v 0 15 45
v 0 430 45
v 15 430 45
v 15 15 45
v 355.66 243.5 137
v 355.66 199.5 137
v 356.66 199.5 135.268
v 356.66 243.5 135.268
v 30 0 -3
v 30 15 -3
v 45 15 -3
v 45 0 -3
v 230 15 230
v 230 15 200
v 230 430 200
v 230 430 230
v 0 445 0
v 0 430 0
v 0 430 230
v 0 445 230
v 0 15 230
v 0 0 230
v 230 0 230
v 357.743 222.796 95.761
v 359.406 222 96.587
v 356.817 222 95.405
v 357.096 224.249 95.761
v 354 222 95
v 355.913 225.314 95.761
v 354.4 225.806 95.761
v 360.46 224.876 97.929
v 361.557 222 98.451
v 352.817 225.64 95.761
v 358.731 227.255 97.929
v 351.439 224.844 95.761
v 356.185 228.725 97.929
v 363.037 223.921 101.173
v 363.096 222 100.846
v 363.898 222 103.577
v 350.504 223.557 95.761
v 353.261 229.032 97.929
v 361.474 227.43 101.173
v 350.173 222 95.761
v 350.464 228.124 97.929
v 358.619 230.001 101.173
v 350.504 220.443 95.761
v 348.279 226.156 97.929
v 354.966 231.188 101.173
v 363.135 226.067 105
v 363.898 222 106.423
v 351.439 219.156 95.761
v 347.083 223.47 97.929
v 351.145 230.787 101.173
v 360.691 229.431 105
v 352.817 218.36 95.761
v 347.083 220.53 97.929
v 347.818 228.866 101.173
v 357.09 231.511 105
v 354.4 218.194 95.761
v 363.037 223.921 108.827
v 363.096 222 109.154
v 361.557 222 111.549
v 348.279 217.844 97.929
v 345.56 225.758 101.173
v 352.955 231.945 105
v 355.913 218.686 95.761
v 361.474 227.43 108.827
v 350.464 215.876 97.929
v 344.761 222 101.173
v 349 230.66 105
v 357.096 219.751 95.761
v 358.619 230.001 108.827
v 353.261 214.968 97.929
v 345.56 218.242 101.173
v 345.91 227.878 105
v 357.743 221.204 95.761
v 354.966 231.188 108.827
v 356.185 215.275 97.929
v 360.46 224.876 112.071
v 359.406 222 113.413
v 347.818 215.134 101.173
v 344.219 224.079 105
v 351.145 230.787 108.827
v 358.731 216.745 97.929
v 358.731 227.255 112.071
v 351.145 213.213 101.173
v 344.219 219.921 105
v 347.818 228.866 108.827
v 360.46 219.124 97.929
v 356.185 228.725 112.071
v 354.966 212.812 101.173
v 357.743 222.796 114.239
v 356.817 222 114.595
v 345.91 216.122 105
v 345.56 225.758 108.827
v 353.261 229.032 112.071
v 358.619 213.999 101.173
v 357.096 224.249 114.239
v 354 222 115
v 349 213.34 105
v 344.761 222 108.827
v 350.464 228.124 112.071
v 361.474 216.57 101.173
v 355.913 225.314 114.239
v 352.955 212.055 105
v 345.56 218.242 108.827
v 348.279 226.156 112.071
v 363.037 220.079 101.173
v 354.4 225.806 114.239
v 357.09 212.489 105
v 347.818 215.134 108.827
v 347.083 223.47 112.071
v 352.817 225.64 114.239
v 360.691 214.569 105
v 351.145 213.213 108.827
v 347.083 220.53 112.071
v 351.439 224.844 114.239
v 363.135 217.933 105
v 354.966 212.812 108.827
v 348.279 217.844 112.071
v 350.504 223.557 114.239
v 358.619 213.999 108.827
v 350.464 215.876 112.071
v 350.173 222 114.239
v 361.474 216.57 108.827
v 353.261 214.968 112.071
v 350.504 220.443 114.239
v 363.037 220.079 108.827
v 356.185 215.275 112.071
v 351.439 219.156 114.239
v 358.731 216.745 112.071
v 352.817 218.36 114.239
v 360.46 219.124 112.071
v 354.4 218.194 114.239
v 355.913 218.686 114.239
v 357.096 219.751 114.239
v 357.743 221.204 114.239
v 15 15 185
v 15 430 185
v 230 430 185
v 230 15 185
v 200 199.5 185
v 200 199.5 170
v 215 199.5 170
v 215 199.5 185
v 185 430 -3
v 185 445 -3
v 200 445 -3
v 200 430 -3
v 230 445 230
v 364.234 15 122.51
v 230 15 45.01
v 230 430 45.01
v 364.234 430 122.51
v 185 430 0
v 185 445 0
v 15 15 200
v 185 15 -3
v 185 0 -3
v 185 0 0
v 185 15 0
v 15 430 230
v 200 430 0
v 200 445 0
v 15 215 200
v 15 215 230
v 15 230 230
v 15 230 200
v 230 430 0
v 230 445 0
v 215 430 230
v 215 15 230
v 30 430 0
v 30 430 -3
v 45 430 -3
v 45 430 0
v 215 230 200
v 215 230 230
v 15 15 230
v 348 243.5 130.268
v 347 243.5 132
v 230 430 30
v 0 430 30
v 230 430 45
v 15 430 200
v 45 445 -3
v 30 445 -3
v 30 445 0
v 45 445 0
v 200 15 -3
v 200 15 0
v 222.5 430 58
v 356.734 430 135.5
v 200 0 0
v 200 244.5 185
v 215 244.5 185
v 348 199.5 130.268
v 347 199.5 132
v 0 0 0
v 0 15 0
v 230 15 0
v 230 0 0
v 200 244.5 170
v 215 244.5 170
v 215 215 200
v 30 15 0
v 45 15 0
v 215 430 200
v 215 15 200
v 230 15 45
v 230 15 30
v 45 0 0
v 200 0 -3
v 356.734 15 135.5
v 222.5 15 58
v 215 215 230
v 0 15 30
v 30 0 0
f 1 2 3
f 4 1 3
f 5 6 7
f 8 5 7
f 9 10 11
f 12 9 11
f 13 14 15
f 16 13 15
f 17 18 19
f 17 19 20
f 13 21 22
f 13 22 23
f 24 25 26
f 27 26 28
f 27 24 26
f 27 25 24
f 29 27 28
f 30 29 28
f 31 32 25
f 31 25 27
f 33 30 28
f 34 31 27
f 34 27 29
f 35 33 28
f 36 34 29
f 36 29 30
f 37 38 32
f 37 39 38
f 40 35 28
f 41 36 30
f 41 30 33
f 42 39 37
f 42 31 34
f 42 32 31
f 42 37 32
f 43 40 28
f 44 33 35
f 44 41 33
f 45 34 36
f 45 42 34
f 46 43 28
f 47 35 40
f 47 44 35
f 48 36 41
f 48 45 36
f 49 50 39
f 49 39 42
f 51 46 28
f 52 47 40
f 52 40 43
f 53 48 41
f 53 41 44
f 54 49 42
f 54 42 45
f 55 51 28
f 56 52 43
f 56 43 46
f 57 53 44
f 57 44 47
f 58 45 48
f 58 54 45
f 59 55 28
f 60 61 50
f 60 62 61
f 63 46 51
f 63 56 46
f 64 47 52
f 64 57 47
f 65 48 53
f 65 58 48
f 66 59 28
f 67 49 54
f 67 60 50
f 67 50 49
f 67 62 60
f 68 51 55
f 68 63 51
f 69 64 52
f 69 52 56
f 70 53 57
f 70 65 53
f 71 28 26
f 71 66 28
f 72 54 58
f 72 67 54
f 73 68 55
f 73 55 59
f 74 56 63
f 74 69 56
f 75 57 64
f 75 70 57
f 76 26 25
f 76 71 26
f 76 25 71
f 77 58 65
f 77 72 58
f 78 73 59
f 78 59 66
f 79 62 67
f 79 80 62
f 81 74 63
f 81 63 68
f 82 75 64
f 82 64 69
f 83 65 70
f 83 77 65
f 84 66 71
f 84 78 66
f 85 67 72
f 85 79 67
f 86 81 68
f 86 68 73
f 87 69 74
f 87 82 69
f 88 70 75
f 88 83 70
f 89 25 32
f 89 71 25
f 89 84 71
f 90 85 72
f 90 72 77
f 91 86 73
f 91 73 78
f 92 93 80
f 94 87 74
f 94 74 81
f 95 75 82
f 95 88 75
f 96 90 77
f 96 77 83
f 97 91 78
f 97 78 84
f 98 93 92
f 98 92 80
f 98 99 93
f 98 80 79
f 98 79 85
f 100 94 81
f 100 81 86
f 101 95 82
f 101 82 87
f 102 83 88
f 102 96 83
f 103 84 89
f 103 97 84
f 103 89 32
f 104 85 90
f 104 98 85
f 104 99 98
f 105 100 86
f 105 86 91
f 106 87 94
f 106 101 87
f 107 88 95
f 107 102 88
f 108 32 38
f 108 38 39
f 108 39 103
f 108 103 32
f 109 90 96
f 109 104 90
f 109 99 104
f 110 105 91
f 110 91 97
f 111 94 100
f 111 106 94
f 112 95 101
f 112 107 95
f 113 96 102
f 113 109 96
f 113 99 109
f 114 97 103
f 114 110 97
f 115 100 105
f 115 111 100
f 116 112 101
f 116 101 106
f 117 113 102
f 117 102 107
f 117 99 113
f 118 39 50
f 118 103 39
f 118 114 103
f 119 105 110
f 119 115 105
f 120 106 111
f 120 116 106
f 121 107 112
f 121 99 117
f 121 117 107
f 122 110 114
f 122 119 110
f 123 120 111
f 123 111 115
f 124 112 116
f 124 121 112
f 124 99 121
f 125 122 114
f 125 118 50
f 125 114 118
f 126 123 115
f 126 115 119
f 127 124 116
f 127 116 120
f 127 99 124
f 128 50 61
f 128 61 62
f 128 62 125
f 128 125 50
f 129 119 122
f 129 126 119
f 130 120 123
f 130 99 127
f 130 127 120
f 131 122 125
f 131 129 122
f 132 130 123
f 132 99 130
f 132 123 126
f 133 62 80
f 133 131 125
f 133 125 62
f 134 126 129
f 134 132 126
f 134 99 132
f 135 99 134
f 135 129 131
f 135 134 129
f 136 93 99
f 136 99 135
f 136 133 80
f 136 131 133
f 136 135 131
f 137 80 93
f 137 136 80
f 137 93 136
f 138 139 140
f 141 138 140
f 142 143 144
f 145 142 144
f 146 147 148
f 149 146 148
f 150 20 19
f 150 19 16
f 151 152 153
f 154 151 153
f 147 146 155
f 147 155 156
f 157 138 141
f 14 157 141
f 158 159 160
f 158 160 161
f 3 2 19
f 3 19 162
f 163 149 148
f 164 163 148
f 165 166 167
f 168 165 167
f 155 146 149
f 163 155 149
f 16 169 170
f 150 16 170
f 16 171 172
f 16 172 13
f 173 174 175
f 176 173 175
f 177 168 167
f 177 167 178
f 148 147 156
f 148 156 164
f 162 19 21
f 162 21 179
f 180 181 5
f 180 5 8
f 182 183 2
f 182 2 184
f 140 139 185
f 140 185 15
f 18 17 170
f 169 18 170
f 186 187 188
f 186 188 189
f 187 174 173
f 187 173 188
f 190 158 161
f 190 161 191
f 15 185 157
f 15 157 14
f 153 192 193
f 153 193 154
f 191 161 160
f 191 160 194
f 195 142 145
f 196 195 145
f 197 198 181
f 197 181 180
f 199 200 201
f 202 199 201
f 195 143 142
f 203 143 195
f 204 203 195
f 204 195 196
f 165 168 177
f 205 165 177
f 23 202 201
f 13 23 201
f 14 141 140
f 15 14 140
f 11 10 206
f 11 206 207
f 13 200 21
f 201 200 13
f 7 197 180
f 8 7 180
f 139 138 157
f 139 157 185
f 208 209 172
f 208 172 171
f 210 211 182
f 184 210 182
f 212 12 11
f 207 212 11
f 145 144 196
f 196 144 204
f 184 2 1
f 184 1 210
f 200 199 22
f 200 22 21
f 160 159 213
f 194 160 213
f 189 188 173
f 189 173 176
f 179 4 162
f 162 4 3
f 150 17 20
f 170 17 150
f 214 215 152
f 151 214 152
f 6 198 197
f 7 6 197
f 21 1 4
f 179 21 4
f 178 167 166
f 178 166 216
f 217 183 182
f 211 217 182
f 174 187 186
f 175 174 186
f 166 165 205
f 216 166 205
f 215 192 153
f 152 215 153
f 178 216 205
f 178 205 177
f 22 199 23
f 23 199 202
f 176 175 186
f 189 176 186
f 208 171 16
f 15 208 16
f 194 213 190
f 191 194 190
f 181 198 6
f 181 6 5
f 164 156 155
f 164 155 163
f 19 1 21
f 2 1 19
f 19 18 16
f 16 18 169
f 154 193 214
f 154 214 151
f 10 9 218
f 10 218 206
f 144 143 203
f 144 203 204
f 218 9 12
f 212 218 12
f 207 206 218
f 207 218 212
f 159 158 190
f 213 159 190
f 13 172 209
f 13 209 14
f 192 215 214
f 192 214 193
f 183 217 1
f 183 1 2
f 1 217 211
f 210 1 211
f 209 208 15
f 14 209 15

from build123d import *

# Parameters (mm, degrees)
BOX_W              = 230
BOX_H              = 15
BOX_DEPTH          = 230
BOX001_W           = 215
BOX001_H           = 415
BOX001_DEPTH       = 15
BOX002_W           = 230
BOX002_H           = 15
BOX002_DEPTH       = 230
BOX003_W           = 200
BOX003_H           = 15
BOX003_DEPTH       = 30
BOX005_W           = 15
BOX005_H           = 415
BOX005_DEPTH       = 30
BOX006_W           = 15
BOX006_H           = 415
BOX006_DEPTH       = 185
BOX007_W           = 230
BOX007_H           = 415
BOX007_DEPTH       = 15
BOX008_W           = 15
BOX008_H           = 415
BOX008_DEPTH       = 155
BOX008_PITCH_ANGLE = 60
BOX010_W           = 15
BOX010_H           = 45
BOX010_DEPTH       = 15
BOX011_W           = 2
BOX011_H           = 44
BOX011_DEPTH       = 10
BOX011_PITCH_ANGLE = 60
BOX012_W           = 15
BOX012_H           = 15
BOX012_DEPTH       = 3
BOX013_W           = 15
BOX013_H           = 15
BOX013_DEPTH       = 3
BOX014_W           = 15
BOX014_H           = 15
BOX014_DEPTH       = 3
BOX015_W           = 15
BOX015_H           = 15
BOX015_DEPTH       = 3


with BuildPart() as suportelateralverticalesquerdo:
    # Box → Box (new body)
    with BuildSketch(Plane.XY):
        with Locations((115, 7.5)):
            Rectangle(BOX_W, BOX_H)
    extrude(amount=BOX_DEPTH)


with BuildPart() as tamposuperiorhorizontal:
    # Box001 → Box001 (new body)
    with BuildSketch(Plane(origin=(15, 15, 185), x_dir=(1, 0, 0), z_dir=(0, 0, 1))):
        with Locations((107.5, 207.5)):
            Rectangle(BOX001_W, BOX001_H)
    extrude(amount=BOX001_DEPTH)


with BuildPart() as suportelateralverticaldireito:
    # Box002 → Box002 (new body)
    with BuildSketch(Plane(origin=(0, 430, 0), x_dir=(1, 0, 0), z_dir=(0, 0, 1))):
        with Locations((115, 7.5)):
            Rectangle(BOX002_W, BOX002_H)
    extrude(amount=BOX002_DEPTH)


with BuildPart() as suporteverticalmeio:
    # Box003 → Box003 (new body)
    with BuildSketch(Plane(origin=(15, 215, 200), x_dir=(1, 0, 0), z_dir=(0, 0, 1))):
        with Locations((100, 7.5)):
            Rectangle(BOX003_W, BOX003_H)
    extrude(amount=BOX003_DEPTH)


with BuildPart() as suportefrentesuperiorvertical:
    # Box005 → Box005 (new body)
    with BuildSketch(Plane(origin=(215, 15, 200), x_dir=(1, 0, 0), z_dir=(0, 0, 1))):
        with Locations((7.5, 207.5)):
            Rectangle(BOX005_W, BOX005_H)
    extrude(amount=BOX005_DEPTH)


with BuildPart() as suportefundoinferiorvertical:
    # Box006 → Box006 (new body)
    with BuildSketch(Plane(origin=(0, 15, 45), x_dir=(1, 0, 0), z_dir=(0, 0, 1))):
        with Locations((7.5, 207.5)):
            Rectangle(BOX006_W, BOX006_H)
    extrude(amount=BOX006_DEPTH)


with BuildPart() as tampoinferiorhorizontal:
    # Box007 → Box007 (new body)
    with BuildSketch(Plane(origin=(0, 15, 30), x_dir=(1, 0, 0), z_dir=(0, 0, 1))):
        with Locations((115, 207.5)):
            Rectangle(BOX007_W, BOX007_H)
    extrude(amount=BOX007_DEPTH)


with BuildPart() as tampabasculante:
    # Box008 → Box008 (new body)
    with BuildSketch(Plane.XY):
        with Locations((7.5, 207.5)):
            Rectangle(BOX008_W, BOX008_H)
    extrude(amount=BOX008_DEPTH)


with BuildPart() as tampabasculante_1:
    # Box008 pitch: moved
    add(tampabasculante.part.rotate(Axis((0, 0, 0), (0, 1, 0)), BOX008_PITCH_ANGLE))


with BuildPart() as tampabasculante_2:
    # Box008 placement: moved
    add(tampabasculante_1.part.moved(Location((222.5, 15, 58))))


with BuildPart() as imadamesa_superiorhorizontal:
    # Box010 → Box010 (new body)
    with BuildSketch(Plane(origin=(200, 199.5, 170), x_dir=(1, 0, 0), z_dir=(0, 0, 1))):
        with Locations((7.5, 22.5)):
            Rectangle(BOX010_W, BOX010_H)
    extrude(amount=BOX010_DEPTH)


with BuildPart() as chapadoima:
    # Box011 → Box011 (new body)
    with BuildSketch(Plane.XY):
        with Locations((1, 22)):
            Rectangle(BOX011_W, BOX011_H)
    extrude(amount=BOX011_DEPTH)


with BuildPart() as chapadoima_1:
    # Box011 pitch: moved
    add(chapadoima.part.rotate(Axis((0, 0, 0), (0, 1, 0)), BOX011_PITCH_ANGLE))


with BuildPart() as chapadoima_2:
    # Box011 placement: moved
    add(chapadoima_1.part.moved(Location((347, 199.5, 132))))


with BuildPart() as puxador:
    # Sphere → Sphere (revolve)
    with BuildSketch(Plane(origin=(354, 222, 105), x_dir=(1, 0, 0), z_dir=(0, -1, 0))):
        with BuildLine():
            ThreePointArc((0, -10), (10, 0), (0, 10))
            Line((0, 10), (0, -10))
        make_face()
    revolve(axis=Axis((354, 222, 105), (0, 0, 1)))


with BuildPart() as cube:
    # Box012 → Box012 (new body)
    with BuildSketch(Plane(origin=(30, 0, -3), x_dir=(1, 0, 0), z_dir=(0, 0, 1))):
        with Locations((7.5, 7.5)):
            Rectangle(BOX012_W, BOX012_H)
    extrude(amount=BOX012_DEPTH)


with BuildPart() as cube001:
    # Box013 → Box013 (new body)
    with BuildSketch(Plane(origin=(185, 0, -3), x_dir=(1, 0, 0), z_dir=(0, 0, 1))):
        with Locations((7.5, 7.5)):
            Rectangle(BOX013_W, BOX013_H)
    extrude(amount=BOX013_DEPTH)


with BuildPart() as cube002:
    # Box014 → Box014 (new body)
    with BuildSketch(Plane(origin=(30, 430, -3), x_dir=(1, 0, 0), z_dir=(0, 0, 1))):
        with Locations((7.5, 7.5)):
            Rectangle(BOX014_W, BOX014_H)
    extrude(amount=BOX014_DEPTH)


with BuildPart() as cube003:
    # Box015 → Box015 (new body)
    with BuildSketch(Plane(origin=(185, 430, -3), x_dir=(1, 0, 0), z_dir=(0, 0, 1))):
        with Locations((7.5, 7.5)):
            Rectangle(BOX015_W, BOX015_H)
    extrude(amount=BOX015_DEPTH)


solid = Compound([suportelateralverticalesquerdo.part, tamposuperiorhorizontal.part, suportelateralverticaldireito.part, suporteverticalmeio.part, suportefrentesuperiorvertical.part, suportefundoinferiorvertical.part, tampoinferiorhorizontal.part, tampabasculante_2.part, imadamesa_superiorhorizontal.part, chapadoima_2.part, puxador.part, cube.part, cube001.part, cube002.part, cube003.part])
